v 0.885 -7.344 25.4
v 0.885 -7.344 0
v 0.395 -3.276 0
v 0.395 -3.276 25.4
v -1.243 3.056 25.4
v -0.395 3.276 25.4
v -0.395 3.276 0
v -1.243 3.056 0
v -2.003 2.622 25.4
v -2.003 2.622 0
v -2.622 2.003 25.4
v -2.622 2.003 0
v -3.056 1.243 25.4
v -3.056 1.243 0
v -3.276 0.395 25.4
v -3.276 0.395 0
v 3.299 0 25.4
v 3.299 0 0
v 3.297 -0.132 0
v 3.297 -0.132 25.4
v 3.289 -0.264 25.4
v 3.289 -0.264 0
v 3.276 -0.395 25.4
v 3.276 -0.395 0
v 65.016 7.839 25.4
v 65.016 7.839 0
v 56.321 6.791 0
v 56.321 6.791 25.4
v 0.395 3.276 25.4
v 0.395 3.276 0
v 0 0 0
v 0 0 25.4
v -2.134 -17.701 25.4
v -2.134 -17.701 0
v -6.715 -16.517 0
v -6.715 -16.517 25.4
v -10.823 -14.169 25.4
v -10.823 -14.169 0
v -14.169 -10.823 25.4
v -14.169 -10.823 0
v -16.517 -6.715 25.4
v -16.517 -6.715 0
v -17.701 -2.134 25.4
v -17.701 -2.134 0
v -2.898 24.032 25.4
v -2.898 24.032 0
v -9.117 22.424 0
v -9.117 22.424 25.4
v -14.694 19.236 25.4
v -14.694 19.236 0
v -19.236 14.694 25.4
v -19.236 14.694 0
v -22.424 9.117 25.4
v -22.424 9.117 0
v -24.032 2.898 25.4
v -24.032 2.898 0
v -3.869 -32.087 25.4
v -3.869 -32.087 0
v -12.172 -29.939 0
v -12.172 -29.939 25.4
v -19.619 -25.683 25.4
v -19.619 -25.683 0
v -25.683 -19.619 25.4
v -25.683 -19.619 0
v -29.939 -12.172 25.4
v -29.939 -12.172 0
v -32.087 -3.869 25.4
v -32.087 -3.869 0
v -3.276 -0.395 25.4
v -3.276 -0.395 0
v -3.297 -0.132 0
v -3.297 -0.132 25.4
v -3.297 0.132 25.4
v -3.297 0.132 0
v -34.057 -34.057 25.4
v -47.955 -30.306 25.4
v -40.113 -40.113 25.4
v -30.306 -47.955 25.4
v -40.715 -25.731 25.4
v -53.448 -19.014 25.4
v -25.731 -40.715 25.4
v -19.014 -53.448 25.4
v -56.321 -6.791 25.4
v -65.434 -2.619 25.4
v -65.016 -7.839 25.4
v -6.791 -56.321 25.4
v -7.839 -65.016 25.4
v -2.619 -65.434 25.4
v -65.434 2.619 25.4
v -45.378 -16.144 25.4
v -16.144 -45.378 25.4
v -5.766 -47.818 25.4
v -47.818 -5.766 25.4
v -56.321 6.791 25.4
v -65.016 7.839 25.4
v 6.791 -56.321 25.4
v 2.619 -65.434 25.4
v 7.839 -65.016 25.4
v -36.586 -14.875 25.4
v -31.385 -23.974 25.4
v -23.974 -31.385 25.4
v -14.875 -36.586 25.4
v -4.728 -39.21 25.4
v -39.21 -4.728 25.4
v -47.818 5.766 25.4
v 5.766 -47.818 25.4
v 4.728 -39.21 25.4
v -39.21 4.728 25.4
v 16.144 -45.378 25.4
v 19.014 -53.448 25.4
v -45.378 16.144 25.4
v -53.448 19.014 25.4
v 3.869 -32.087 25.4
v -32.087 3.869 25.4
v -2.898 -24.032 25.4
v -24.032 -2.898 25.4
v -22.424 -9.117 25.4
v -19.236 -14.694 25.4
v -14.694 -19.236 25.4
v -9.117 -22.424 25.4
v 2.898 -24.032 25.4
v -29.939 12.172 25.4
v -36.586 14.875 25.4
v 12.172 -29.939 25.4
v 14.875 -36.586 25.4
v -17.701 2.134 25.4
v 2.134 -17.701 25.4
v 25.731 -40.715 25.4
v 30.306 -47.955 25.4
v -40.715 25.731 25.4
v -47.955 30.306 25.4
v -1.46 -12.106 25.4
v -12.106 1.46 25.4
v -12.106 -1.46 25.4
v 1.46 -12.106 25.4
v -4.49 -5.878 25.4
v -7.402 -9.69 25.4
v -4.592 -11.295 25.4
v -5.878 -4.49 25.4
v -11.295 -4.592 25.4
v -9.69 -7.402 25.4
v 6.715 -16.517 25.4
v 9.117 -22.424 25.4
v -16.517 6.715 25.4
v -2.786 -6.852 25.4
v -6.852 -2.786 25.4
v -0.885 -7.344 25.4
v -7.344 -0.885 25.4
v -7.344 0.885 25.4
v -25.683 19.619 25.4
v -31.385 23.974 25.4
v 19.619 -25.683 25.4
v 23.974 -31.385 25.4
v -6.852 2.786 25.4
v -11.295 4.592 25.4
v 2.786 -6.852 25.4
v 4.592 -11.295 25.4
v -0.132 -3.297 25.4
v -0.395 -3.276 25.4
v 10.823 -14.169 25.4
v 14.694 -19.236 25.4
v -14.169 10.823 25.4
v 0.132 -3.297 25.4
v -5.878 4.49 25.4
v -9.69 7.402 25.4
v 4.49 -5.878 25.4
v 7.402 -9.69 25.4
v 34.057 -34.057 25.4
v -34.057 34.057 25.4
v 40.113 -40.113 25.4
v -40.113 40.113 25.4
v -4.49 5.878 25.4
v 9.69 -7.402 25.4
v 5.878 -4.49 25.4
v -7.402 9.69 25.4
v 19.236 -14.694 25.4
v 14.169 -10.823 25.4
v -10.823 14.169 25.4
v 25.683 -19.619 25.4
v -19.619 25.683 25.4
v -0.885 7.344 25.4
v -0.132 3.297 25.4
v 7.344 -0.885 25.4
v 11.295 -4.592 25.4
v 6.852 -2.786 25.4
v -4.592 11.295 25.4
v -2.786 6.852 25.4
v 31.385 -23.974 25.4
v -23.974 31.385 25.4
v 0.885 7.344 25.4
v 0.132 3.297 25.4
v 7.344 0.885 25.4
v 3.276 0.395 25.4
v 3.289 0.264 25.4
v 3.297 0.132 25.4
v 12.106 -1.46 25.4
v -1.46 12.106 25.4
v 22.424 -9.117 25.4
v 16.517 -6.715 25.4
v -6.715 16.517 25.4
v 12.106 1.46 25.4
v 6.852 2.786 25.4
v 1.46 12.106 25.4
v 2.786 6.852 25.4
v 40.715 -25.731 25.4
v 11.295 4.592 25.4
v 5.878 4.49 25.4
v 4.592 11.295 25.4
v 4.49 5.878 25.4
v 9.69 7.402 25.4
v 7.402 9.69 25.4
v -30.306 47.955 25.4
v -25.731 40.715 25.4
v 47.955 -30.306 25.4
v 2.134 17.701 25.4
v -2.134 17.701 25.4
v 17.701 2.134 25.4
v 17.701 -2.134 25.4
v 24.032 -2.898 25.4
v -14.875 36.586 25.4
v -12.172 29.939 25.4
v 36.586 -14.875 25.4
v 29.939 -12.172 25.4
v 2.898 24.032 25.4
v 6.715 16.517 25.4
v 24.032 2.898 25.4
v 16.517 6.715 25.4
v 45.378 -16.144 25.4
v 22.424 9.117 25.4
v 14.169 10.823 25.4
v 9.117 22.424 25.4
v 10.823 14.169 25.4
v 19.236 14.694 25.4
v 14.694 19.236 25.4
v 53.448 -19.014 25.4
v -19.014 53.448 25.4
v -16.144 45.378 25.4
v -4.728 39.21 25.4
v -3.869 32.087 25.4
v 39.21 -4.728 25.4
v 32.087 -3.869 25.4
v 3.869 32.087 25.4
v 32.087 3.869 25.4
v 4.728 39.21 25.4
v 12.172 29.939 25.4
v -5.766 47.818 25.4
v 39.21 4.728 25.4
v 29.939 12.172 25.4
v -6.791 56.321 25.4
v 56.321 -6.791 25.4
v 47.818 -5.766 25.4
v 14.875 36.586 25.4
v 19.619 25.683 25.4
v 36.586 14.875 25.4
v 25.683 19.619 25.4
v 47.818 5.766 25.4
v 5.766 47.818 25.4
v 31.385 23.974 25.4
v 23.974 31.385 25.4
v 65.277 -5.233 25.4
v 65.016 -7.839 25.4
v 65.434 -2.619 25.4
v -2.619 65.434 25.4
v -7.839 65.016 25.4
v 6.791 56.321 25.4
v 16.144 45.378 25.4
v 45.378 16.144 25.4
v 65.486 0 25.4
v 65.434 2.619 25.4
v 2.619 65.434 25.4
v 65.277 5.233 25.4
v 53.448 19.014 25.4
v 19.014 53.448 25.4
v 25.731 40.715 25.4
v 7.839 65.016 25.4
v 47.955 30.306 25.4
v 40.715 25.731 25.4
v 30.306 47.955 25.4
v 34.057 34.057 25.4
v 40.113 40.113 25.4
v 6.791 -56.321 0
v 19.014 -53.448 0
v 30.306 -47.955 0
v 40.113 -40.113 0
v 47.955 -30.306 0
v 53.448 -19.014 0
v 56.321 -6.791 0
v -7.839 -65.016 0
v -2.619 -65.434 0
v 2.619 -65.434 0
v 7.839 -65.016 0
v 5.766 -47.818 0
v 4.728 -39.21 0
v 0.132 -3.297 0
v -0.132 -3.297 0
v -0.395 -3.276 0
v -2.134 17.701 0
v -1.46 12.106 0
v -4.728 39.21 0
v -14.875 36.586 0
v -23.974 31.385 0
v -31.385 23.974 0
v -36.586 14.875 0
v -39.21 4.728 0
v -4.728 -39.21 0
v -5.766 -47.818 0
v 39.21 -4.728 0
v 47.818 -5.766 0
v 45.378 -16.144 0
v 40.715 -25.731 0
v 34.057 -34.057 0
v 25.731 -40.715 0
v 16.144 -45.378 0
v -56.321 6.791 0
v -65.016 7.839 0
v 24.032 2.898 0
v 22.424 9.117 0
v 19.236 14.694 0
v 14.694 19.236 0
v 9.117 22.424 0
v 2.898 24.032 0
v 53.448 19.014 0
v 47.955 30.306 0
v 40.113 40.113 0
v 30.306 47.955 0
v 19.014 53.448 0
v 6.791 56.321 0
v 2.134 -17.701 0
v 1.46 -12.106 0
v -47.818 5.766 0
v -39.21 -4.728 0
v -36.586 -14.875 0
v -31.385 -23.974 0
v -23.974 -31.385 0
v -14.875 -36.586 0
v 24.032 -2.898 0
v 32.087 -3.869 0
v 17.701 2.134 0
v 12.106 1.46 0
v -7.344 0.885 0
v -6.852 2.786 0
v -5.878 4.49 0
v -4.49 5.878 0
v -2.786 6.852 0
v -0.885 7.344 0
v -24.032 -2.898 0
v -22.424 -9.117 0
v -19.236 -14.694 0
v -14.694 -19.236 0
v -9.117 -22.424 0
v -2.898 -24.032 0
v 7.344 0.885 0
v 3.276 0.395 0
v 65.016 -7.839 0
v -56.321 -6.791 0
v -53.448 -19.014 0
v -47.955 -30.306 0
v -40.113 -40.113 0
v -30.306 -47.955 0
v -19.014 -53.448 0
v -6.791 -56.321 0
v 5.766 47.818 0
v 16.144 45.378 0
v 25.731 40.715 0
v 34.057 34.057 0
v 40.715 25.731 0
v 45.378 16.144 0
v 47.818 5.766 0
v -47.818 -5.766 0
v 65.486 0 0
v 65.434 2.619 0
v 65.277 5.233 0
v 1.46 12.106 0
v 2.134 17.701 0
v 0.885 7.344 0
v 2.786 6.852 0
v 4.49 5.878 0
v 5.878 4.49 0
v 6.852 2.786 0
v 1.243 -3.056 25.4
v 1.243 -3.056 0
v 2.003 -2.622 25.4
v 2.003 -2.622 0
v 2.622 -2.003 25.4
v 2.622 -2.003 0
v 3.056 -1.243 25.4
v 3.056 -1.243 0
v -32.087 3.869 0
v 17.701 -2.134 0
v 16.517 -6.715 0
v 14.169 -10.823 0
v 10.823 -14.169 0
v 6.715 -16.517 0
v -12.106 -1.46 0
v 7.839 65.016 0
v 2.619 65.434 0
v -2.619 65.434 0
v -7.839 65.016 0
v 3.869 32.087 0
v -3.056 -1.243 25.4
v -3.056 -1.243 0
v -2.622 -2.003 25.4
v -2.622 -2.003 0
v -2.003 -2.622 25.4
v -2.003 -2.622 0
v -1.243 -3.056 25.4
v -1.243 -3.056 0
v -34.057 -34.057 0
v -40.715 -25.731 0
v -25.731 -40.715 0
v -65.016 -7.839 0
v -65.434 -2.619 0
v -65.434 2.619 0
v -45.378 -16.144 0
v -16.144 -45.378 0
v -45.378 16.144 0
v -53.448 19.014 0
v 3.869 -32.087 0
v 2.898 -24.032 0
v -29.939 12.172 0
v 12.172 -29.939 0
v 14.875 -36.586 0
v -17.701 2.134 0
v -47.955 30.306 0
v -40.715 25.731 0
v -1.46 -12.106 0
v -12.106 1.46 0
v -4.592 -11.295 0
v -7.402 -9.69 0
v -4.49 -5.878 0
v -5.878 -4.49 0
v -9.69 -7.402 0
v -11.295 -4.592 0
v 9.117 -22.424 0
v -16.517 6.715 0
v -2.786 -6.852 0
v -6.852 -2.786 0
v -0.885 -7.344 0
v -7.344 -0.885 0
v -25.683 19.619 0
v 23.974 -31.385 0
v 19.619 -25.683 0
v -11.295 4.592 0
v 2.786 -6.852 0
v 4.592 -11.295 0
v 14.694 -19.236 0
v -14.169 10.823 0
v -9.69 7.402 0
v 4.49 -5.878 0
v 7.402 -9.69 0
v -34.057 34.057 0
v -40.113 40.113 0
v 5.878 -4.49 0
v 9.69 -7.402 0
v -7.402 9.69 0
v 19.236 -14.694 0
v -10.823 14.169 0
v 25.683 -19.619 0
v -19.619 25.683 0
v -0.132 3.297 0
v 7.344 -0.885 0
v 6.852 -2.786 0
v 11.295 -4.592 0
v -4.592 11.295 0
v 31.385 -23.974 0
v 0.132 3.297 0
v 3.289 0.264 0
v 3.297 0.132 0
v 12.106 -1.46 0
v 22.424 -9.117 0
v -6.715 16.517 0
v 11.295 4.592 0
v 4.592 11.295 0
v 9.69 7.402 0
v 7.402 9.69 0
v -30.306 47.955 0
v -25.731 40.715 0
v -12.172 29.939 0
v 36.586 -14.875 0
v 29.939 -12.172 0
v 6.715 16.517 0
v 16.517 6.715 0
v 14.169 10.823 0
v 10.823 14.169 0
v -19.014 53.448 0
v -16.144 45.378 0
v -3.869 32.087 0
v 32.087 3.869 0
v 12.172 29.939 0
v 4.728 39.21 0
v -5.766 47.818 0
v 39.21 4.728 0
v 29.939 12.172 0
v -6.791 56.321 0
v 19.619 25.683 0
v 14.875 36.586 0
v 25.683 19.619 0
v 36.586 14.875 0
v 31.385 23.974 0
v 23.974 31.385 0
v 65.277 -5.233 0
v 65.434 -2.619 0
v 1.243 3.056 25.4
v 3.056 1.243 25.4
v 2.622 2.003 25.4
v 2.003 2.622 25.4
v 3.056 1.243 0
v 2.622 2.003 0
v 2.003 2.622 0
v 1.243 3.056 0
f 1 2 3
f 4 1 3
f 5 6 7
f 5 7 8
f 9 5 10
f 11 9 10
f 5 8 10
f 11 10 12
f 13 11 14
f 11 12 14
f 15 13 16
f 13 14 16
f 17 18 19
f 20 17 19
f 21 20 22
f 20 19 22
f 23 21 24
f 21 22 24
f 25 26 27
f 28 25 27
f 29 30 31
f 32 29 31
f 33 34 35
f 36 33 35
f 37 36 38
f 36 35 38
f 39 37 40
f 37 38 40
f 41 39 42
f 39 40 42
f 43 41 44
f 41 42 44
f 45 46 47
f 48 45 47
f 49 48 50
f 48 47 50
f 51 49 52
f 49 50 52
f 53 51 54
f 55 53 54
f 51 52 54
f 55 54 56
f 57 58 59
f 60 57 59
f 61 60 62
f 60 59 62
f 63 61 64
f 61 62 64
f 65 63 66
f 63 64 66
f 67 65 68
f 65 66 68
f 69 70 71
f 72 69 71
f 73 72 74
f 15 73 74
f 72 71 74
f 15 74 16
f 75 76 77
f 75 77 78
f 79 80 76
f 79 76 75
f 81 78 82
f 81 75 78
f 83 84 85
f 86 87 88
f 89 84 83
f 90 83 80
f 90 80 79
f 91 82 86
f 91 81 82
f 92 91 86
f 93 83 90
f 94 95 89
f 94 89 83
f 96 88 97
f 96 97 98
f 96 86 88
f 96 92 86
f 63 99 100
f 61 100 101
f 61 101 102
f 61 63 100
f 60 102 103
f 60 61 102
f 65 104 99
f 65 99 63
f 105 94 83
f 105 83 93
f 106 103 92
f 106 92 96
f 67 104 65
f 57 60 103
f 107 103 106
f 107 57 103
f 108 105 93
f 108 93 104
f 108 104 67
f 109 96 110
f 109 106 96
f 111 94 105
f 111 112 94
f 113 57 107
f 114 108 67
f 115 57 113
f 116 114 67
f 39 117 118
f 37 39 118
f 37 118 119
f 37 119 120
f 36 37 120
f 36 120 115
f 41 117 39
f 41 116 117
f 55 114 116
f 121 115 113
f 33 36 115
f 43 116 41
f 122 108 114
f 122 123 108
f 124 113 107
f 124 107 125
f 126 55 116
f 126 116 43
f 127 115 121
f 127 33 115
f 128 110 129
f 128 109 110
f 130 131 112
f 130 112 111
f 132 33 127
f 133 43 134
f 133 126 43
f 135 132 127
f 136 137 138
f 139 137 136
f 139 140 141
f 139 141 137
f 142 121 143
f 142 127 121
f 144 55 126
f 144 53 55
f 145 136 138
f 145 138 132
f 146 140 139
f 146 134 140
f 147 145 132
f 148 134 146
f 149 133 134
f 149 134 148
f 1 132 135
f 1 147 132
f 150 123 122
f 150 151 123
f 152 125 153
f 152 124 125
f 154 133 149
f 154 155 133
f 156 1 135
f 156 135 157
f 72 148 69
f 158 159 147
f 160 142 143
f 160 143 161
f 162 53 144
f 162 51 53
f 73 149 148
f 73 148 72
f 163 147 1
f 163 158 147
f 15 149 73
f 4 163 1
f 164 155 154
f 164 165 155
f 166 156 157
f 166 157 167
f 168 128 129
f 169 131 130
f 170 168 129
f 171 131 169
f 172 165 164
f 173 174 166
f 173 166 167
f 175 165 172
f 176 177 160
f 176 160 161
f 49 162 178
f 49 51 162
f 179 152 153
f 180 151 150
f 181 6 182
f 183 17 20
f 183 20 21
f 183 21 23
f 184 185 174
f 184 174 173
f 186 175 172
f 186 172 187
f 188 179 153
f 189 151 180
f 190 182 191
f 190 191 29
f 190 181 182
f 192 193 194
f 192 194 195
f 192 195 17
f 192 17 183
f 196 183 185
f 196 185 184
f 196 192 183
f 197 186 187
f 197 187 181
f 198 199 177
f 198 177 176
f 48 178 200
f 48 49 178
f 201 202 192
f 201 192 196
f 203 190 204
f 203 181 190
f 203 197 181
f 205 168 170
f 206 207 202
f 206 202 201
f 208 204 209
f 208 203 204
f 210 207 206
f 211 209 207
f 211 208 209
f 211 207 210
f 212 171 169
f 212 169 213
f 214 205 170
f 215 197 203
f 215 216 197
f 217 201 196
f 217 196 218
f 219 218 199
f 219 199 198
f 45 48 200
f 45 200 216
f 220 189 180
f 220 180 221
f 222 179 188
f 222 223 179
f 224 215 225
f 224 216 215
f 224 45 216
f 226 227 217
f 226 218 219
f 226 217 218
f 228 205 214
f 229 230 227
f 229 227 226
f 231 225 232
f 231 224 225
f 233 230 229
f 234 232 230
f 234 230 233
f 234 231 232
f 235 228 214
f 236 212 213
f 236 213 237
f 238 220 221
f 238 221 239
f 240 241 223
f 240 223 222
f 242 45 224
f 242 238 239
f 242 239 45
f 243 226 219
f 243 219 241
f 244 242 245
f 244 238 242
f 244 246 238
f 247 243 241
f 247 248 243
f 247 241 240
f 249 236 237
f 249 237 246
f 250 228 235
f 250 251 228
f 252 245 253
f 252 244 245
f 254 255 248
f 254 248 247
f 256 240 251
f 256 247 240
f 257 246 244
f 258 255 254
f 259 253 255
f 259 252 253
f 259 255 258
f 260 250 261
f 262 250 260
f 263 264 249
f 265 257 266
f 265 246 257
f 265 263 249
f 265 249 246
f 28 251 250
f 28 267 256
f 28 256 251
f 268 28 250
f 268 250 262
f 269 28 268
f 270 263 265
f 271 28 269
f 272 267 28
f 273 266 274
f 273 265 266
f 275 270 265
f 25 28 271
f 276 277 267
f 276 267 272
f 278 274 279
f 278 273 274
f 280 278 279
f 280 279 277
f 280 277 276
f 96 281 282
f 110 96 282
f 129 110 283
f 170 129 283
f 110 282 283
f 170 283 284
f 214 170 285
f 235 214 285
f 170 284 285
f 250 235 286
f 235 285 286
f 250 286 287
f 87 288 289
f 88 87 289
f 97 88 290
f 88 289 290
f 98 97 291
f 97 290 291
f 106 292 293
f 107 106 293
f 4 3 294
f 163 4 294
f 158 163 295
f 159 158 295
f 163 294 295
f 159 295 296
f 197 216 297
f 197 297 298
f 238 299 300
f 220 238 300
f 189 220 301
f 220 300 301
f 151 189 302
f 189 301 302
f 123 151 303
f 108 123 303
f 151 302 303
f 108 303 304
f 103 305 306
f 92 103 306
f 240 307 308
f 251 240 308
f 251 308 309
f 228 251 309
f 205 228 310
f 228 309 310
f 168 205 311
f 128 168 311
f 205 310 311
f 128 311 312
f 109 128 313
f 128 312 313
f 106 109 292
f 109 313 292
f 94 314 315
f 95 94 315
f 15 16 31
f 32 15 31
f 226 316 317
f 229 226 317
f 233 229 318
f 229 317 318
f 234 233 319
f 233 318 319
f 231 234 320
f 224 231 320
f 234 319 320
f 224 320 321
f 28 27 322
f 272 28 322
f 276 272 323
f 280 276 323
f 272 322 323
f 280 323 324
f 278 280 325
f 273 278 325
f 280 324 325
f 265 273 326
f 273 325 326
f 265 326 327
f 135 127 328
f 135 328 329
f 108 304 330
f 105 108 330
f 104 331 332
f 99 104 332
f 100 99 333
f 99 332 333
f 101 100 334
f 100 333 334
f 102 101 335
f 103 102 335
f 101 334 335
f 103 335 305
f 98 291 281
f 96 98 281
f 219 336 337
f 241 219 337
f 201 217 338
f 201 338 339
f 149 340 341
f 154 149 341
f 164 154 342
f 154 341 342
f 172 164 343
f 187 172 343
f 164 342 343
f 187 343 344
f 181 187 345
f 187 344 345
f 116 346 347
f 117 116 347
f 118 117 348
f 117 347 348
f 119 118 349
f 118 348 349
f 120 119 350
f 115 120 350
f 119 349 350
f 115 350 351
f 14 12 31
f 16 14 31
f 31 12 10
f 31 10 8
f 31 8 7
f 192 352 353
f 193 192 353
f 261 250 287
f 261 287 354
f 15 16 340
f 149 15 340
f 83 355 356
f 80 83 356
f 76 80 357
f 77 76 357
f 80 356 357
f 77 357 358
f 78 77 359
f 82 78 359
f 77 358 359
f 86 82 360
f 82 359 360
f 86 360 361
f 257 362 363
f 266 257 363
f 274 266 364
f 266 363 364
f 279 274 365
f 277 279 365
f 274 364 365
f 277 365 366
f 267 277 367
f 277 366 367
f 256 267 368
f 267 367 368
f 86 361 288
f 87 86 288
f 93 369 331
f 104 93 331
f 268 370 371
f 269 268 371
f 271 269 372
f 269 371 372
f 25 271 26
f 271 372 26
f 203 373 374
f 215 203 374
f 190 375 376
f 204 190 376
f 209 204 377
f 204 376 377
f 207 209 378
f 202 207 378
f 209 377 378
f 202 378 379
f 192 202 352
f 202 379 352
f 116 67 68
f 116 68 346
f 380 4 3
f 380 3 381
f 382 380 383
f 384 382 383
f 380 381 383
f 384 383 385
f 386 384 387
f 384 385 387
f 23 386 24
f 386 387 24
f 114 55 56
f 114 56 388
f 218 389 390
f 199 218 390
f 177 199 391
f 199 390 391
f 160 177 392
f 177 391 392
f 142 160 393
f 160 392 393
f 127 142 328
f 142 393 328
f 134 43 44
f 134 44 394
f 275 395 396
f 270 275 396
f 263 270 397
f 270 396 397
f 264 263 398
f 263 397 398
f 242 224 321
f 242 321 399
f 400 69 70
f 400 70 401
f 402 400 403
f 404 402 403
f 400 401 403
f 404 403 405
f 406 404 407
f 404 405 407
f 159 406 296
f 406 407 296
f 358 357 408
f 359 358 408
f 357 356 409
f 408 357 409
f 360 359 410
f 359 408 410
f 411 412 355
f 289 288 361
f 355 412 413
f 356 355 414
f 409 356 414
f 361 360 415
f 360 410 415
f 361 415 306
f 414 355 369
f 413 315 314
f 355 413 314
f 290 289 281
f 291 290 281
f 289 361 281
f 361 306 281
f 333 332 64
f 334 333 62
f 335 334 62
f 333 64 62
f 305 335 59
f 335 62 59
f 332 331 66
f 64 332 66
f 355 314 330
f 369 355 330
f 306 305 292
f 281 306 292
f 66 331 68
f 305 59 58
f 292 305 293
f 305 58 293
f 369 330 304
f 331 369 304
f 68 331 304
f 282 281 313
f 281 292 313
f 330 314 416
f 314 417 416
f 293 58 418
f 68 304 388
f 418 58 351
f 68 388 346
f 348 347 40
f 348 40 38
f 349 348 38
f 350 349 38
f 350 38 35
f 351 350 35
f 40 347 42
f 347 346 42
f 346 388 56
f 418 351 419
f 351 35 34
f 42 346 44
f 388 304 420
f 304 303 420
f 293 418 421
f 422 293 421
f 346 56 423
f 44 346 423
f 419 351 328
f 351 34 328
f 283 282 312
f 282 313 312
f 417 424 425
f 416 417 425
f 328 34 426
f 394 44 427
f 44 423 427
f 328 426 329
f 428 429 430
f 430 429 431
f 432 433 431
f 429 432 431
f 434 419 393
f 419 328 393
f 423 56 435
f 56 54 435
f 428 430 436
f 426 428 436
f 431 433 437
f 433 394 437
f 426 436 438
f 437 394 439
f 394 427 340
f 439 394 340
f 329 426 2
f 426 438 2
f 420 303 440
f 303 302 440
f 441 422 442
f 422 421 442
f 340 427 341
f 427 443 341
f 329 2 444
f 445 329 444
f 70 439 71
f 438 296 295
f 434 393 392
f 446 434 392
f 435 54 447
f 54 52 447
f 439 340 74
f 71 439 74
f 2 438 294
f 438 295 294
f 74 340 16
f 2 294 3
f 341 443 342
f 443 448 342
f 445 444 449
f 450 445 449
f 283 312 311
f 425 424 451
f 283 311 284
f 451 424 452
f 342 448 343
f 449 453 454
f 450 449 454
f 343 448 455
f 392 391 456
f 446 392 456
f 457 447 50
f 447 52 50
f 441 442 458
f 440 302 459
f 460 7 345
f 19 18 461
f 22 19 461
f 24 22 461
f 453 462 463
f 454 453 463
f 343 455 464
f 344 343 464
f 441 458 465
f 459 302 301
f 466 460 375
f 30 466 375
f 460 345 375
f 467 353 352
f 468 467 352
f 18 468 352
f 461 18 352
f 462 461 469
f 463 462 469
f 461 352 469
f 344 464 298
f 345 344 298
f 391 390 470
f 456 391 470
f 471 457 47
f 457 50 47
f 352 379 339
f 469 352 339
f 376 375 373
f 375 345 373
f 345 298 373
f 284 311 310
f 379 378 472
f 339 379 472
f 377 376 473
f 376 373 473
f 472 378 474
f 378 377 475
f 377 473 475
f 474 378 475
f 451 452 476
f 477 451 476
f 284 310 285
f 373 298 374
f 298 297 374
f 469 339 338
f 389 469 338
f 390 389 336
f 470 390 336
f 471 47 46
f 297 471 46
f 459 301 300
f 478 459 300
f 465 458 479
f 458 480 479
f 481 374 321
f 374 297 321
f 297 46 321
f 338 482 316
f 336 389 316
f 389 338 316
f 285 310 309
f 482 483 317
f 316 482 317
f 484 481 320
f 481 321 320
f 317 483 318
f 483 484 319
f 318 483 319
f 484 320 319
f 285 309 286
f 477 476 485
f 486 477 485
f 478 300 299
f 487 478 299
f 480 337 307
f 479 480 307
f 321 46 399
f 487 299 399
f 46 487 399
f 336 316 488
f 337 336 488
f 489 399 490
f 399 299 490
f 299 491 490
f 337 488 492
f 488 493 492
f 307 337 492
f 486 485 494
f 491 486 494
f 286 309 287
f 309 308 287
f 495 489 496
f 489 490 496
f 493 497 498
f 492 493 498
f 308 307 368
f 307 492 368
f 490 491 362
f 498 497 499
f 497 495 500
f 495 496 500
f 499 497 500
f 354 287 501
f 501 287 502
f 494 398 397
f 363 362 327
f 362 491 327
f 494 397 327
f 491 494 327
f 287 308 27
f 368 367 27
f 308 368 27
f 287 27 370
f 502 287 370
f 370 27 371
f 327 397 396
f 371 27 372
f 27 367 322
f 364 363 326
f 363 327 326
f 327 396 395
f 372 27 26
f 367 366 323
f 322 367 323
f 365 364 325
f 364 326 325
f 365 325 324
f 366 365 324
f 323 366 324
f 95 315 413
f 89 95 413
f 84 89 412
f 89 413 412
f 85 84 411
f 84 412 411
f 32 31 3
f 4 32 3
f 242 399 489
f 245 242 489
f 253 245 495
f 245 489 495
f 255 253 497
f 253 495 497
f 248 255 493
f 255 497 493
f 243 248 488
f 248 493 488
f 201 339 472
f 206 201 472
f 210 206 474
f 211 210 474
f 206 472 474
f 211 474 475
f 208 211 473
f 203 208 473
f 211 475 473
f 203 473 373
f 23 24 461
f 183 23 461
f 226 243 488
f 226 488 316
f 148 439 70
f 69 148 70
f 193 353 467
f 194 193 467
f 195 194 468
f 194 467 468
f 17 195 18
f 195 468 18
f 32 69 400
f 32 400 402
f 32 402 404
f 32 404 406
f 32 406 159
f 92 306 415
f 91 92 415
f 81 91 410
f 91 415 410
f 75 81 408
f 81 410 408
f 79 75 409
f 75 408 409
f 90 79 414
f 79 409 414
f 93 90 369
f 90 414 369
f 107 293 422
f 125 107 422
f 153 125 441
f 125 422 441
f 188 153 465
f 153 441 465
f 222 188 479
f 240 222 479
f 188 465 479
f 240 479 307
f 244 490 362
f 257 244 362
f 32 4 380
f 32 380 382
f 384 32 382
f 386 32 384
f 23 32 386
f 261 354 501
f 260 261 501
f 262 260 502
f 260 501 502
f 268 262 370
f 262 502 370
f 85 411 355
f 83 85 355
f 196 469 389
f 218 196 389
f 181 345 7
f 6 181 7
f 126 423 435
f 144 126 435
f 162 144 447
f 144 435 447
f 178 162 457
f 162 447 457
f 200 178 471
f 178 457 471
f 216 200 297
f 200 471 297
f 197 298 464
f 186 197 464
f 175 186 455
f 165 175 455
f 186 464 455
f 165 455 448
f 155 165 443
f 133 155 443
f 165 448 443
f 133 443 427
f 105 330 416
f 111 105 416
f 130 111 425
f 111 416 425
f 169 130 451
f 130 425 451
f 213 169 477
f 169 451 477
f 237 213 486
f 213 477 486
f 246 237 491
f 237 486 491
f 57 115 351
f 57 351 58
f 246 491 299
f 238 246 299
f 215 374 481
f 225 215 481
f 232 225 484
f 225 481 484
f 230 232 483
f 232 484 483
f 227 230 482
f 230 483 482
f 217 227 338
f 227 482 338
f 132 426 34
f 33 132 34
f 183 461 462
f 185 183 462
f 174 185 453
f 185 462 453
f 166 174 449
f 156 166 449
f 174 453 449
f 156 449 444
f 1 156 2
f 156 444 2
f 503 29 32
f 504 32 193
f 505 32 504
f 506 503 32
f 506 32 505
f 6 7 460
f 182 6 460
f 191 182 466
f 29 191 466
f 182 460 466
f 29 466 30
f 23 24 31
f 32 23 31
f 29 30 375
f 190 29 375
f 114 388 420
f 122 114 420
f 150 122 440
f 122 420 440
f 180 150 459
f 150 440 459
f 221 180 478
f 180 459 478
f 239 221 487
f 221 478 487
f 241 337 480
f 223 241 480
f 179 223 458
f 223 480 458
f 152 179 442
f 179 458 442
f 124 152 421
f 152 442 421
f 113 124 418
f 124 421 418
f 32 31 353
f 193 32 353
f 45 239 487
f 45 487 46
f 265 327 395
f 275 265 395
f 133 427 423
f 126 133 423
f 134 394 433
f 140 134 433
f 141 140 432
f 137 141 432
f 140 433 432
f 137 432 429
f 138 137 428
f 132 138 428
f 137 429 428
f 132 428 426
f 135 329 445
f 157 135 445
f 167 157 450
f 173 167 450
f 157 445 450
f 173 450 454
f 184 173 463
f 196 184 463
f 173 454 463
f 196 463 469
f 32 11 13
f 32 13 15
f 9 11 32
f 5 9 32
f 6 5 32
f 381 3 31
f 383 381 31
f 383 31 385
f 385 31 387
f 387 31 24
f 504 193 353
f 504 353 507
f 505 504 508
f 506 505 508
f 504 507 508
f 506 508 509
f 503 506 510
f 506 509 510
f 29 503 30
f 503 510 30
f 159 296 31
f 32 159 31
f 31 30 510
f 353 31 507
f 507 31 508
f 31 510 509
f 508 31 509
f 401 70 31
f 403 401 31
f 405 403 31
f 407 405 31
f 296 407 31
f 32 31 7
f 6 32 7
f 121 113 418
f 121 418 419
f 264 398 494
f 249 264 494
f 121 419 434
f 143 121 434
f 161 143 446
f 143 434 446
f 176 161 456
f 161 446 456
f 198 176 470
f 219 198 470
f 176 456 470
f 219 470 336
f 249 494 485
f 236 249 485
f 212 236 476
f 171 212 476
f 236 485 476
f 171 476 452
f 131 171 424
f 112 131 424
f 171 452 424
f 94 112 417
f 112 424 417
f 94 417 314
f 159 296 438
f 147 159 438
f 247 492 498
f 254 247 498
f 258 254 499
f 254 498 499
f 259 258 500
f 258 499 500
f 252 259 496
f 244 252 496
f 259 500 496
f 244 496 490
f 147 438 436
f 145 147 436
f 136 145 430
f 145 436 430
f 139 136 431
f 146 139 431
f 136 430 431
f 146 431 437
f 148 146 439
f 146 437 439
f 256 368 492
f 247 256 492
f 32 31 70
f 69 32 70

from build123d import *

# Parameters (mm, degrees)
F1_DEPTH = 25.4


with BuildPart() as f1:
    # F0 (on Top) → F1 (new body)
    with BuildSketch(Plane.XY):
        with BuildLine():
            ThreePointArc((0.3949463814, -3.2755851114), (2.3329638302, -2.3329638302), (3.2755851114, -0.3949463814))
            Line((3.2755851114, -0.3949463814), (0, 0))
            Line((0, 0), (0.3949463814, -3.2755851114))
        make_face()
    extrude(amount=F1_DEPTH)


with BuildPart() as f1b:
    # F0 (on Top) → F1, piece 2 (new body)
    with BuildSketch(Plane.XY):
        with BuildLine():
            Line((0, 0), (3.2755851114, 0.3949463814))
            ThreePointArc((3.2755851114, 0.3949463814), (2.3329638302, 2.3329638302), (0.3949463814, 3.2755851114))
            Line((0.3949463814, 3.2755851114), (0, 0))
        make_face()
    extrude(amount=F1_DEPTH)


with BuildPart() as f1c:
    # F0 (on Top) → F1, piece 3 (new body)
    with BuildSketch(Plane.XY):
        with BuildLine():
            Line((-3.2755851114, 0.3949463814), (0, 0))
            Line((0, 0), (-0.3949463814, 3.2755851114))
            ThreePointArc((-0.3949463814, 3.2755851114), (-2.3329638302, 2.3329638302), (-3.2755851114, 0.3949463814))
        make_face()
    extrude(amount=F1_DEPTH)


with BuildPart() as f1d:
    # F0 (on Top) → F1, piece 4 (new body)
    with BuildSketch(Plane.XY):
        with BuildLine():
            Line((-0.3949463814, -3.2755851114), (0, 0))
            Line((0, 0), (-3.2755851114, -0.3949463814))
            ThreePointArc((-3.2755851114, -0.3949463814), (-2.3329638302, -2.3329638302), (-0.3949463814, -3.2755851114))
        make_face()
    extrude(amount=F1_DEPTH)


with BuildPart() as f1e:
    # F0 (on Top) → F1, piece 5 (new body)
    with BuildSketch(Plane.XY):
        with BuildLine():
            Line((-0.8854582133, 7.3437658304), (-1.4596083092, 12.1056210961))
            ThreePointArc((-1.4596083092, 12.1056210961), (-8.621963771, 8.621963771), (-12.1056210961, 1.4596083092))
            Line((-12.1056210961, 1.4596083092), (-7.3437658304, 0.8854582133))
            ThreePointArc((-7.3437658304, 0.8854582133), (-5.2304365411, 5.2304365411), (-0.8854582133, 7.3437658304))
        make_face()
        with BuildLine():
            Line((-2.1343025953, 17.7013643731), (-2.8976111776, 24.0320521462))
            ThreePointArc((-2.8976111776, 24.0320521462), (-17.1163033523, 17.1163033523), (-24.0320521462, 2.8976111776))
            Line((-24.0320521462, 2.8976111776), (-17.7013643731, 2.1343025953))
            ThreePointArc((-17.7013643731, 2.1343025953), (-12.6074094928, 12.6074094928), (-2.1343025953, 17.7013643731))
        make_face()
        with BuildLine():
            Line((-3.8687748548, 32.086637356), (-4.7276929236, 39.2102859597))
            ThreePointArc((-4.7276929236, 39.2102859597), (-27.9266683067, 27.9266683067), (-39.2102859597, 4.7276929236))
            Line((-39.2102859597, 4.7276929236), (-32.086637356, 3.8687748548))
            ThreePointArc((-32.086637356, 3.8687748548), (-22.8530054445, 22.8530054445), (-3.8687748548, 32.086637356))
        make_face()
        with BuildLine():
            Line((-5.7655175254, 47.8177399692), (-6.7907928644, 56.3211135761))
            ThreePointArc((-6.7907928644, 56.3211135761), (-40.1134809146, 40.1134809146), (-56.3211135761, 6.7907928644))
            Line((-56.3211135761, 6.7907928644), (-47.8177399692, 5.7655175254))
            ThreePointArc((-47.8177399693, 5.7655175254), (-34.0571391055, 34.0571391055), (-5.7655175254, 47.8177399693))
        make_face()
        with BuildLine():
            Line((47.8177399692, 5.7655175254), (56.3211135761, 6.7907928644))
            ThreePointArc((56.3211135761, 6.7907928644), (40.1134809146, 40.1134809146), (6.7907928644, 56.3211135761))
            Line((6.7907928644, 56.3211135761), (5.7655175254, 47.8177399692))
            ThreePointArc((5.7655175254, 47.8177399693), (34.0571391055, 34.0571391055), (47.8177399692, 5.7655175254))
        make_face()
        with BuildLine():
            ThreePointArc((6.7907928644, -56.3211135761), (40.1134809146, -40.1134809146), (56.3211135761, -6.7907928644))
            Line((56.3211135761, -6.7907928644), (47.8177399692, -5.7655175254))
            ThreePointArc((47.8177399692, -5.7655175254), (34.0571391055, -34.0571391055), (5.7655175254, -47.8177399693))
            Line((5.7655175254, -47.8177399692), (6.7907928644, -56.3211135761))
        make_face()
        with BuildLine():
            ThreePointArc((48.1640680186, 0), (48.0774080441, 2.8879549621), (47.8177399692, 5.7655175254))
            Line((47.8177399692, 5.7655175254), (39.2102859597, 4.7276929236))
            ThreePointArc((39.2102859597, 4.7276929236), (39.4232123648, 2.368107317), (39.4942730712, 0))
            ThreePointArc((39.4942730712, 0), (39.4232123648, -2.368107317), (39.2102859597, -4.7276929236))
            Line((39.2102859597, -4.7276929236), (47.8177399692, -5.7655175254))
            ThreePointArc((47.8177399692, -5.7655175254), (48.0774080441, -2.8879549621), (48.1640680186, 0))
        make_face()
        with BuildLine():
            ThreePointArc((65.0156007019, -7.8391112903), (65.3686595432, -3.9266206806), (65.4864871592, 0))
            ThreePointArc((65.4864871592, 0), (65.3686595432, 3.9266206806), (65.0156007019, 7.8391112903))
            Line((65.0156007019, 7.8391112903), (56.3211135761, 6.7907928644))
            ThreePointArc((56.3211135761, 6.7907928644), (56.6269581255, 3.4015166658), (56.7290287435, 0))
            ThreePointArc((56.7290287435, 0), (56.6269581255, -3.4015166658), (56.3211135761, -6.7907928644))
            Line((56.3211135761, -6.7907928644), (65.0156007019, -7.8391112903))
        make_face()
        with BuildLine():
            ThreePointArc((56.7290287435, 0), (56.6269581255, 3.4015166658), (56.3211135761, 6.7907928644))
            Line((56.3211135761, 6.7907928644), (47.8177399692, 5.7655175254))
            ThreePointArc((47.8177399692, 5.7655175254), (48.0774080441, 2.8879549621), (48.1640680186, 0))
            ThreePointArc((48.1640680186, 0), (48.0774080441, -2.8879549621), (47.8177399692, -5.7655175254))
            Line((47.8177399692, -5.7655175254), (56.3211135761, -6.7907928644))
            ThreePointArc((56.3211135761, -6.7907928644), (56.6269581255, -3.4015166658), (56.7290287435, 0))
        make_face()
        with BuildLine():
            ThreePointArc((39.4942730712, 0), (39.4232123648, 2.368107317), (39.2102859597, 4.7276929236))
            Line((39.2102859597, 4.7276929236), (32.086637356, 3.8687748548))
            ThreePointArc((32.086637356, 3.8687748548), (32.2608797054, 1.9378741787), (32.3190302406, 0))
            ThreePointArc((32.3190302406, 0), (32.2608797054, -1.9378741787), (32.086637356, -3.8687748548))
            Line((32.086637356, -3.8687748548), (39.2102859597, -4.7276929236))
            ThreePointArc((39.2102859597, -4.7276929236), (39.4232123648, -2.368107317), (39.4942730712, 0))
        make_face()
        with BuildLine():
            ThreePointArc((32.3190302406, 0), (32.2608797054, 1.9378741787), (32.086637356, 3.8687748548))
            Line((32.086637356, 3.8687748548), (24.0320521462, 2.8976111776))
            ThreePointArc((24.0320521462, 2.8976111776), (24.1625551085, 1.4514170743), (24.2061083385, 0))
            ThreePointArc((24.2061083385, 0), (24.1625551085, -1.4514170743), (24.0320521462, -2.8976111776))
            Line((24.0320521462, -2.8976111776), (32.086637356, -3.8687748548))
            ThreePointArc((32.086637356, -3.8687748548), (32.2608797054, -1.9378741787), (32.3190302406, 0))
        make_face()
        with BuildLine():
            ThreePointArc((24.2061083385, 0), (24.1625551085, 1.4514170743), (24.0320521462, 2.8976111776))
            Line((24.0320521462, 2.8976111776), (17.7013643731, 2.1343025953))
            ThreePointArc((17.7013643731, 2.1343025953), (17.7974893512, 1.0690748478), (17.8295694911, 0))
            ThreePointArc((17.8295694911, 0), (17.7974893512, -1.0690748478), (17.7013643731, -2.1343025953))
            Line((17.7013643731, -2.1343025953), (24.0320521462, -2.8976111776))
            ThreePointArc((24.0320521462, -2.8976111776), (24.1625551085, -1.4514170743), (24.2061083385, 0))
        make_face()
        with BuildLine():
            ThreePointArc((17.8295694911, 0), (17.7974893512, 1.0690748478), (17.7013643731, 2.1343025953))
            Line((17.7013643731, 2.1343025953), (12.1056210961, 1.4596083092))
            ThreePointArc((12.1056210961, 1.4596083092), (12.1713591115, 0.7311196334), (12.1932980993, 0))
            ThreePointArc((12.1932980993, 0), (12.1713591115, -0.7311196334), (12.1056210961, -1.4596083092))
            Line((12.1056210961, -1.4596083092), (17.7013643731, -2.1343025953))
            ThreePointArc((17.7013643731, -2.1343025953), (17.7974893512, -1.0690748478), (17.8295694911, 0))
        make_face()
        with BuildLine():
            ThreePointArc((12.1932980993, 0), (12.1713591115, 0.7311196334), (12.1056210961, 1.4596083092))
            Line((12.1056210961, 1.4596083092), (7.3437658304, 0.8854582133))
            ThreePointArc((7.3437658304, 0.8854582133), (7.3836452044, 0.44352713), (7.3969542935, 0))
            ThreePointArc((7.3969542935, 0), (7.3836452044, -0.44352713), (7.3437658304, -0.8854582133))
            Line((7.3437658304, -0.8854582133), (12.1056210961, -1.4596083092))
            ThreePointArc((12.1056210961, -1.4596083092), (12.1713591115, -0.7311196334), (12.1932980993, 0))
        make_face()
        with BuildLine():
            ThreePointArc((7.3969542935, 0), (7.3836452044, 0.44352713), (7.3437658304, 0.8854582133))
            Line((7.3437658304, 0.8854582133), (3.2755851114, 0.3949463814))
            ThreePointArc((3.2755851114, 0.3949463814), (3.2933727542, 0.1978291379), (3.2993090892, 0))
            ThreePointArc((3.2993090892, 0), (3.2933727542, -0.1978291379), (3.2755851114, -0.3949463814))
            Line((3.2755851114, -0.3949463814), (7.3437658304, -0.8854582133))
            ThreePointArc((7.3437658304, -0.8854582133), (7.3836452044, -0.44352713), (7.3969542935, 0))
        make_face()
        with BuildLine():
            ThreePointArc((-12.1056210961, -1.4596083092), (-8.621963771, -8.621963771), (-1.4596083092, -12.1056210961))
            Line((-1.4596083092, -12.1056210961), (-0.8854582133, -7.3437658304))
            ThreePointArc((-0.8854582133, -7.3437658304), (-5.2304365411, -5.2304365411), (-7.3437658304, -0.8854582133))
            Line((-7.3437658304, -0.8854582133), (-12.1056210961, -1.4596083092))
        make_face()
        with BuildLine():
            ThreePointArc((1.4596083092, -12.1056210961), (8.621963771, -8.621963771), (12.1056210961, -1.4596083092))
            Line((12.1056210961, -1.4596083092), (7.3437658304, -0.8854582133))
            ThreePointArc((7.3437658304, -0.8854582133), (5.2304365411, -5.2304365411), (0.8854582133, -7.3437658304))
            Line((0.8854582133, -7.3437658304), (1.4596083092, -12.1056210961))
        make_face()
        with BuildLine():
            Line((7.3437658304, 0.8854582133), (12.1056210961, 1.4596083092))
            ThreePointArc((12.1056210961, 1.4596083092), (8.621963771, 8.621963771), (1.4596083092, 12.1056210961))
            Line((1.4596083092, 12.1056210961), (0.8854582133, 7.3437658304))
            ThreePointArc((0.8854582133, 7.3437658304), (5.2304365411, 5.2304365411), (7.3437658304, 0.8854582133))
        make_face()
        with BuildLine():
            Line((0.8854582133, 7.3437658304), (1.4596083092, 12.1056210961))
            ThreePointArc((1.4596083092, 12.1056210961), (0, 12.1932980993), (-1.4596083092, 12.1056210961))
            Line((-1.4596083092, 12.1056210961), (-0.8854582133, 7.3437658304))
            ThreePointArc((-0.8854582133, 7.3437658304), (0, 7.3969542935), (0.8854582133, 7.3437658304))
        make_face()
        with BuildLine():
            Line((-7.3437658304, 0.8854582133), (-12.1056210961, 1.4596083092))
            ThreePointArc((-12.1056210961, 1.4596083092), (-12.1932980993, 0), (-12.1056210961, -1.4596083092))
            Line((-12.1056210961, -1.4596083092), (-7.3437658304, -0.8854582133))
            ThreePointArc((-7.3437658304, -0.8854582133), (-7.3969542935, 0), (-7.3437658304, 0.8854582133))
        make_face()
        with BuildLine():
            ThreePointArc((-1.4596083092, -12.1056210961), (0, -12.1932980993), (1.4596083092, -12.1056210961))
            Line((1.4596083092, -12.1056210961), (0.8854582133, -7.3437658304))
            ThreePointArc((0.8854582133, -7.3437658304), (0, -7.3969542935), (-0.8854582133, -7.3437658304))
            Line((-0.8854582133, -7.3437658304), (-1.4596083092, -12.1056210961))
        make_face()
        with BuildLine():
            ThreePointArc((2.8976111776, -24.0320521462), (17.1163033523, -17.1163033523), (24.0320521462, -2.8976111776))
            Line((24.0320521462, -2.8976111776), (17.7013643731, -2.1343025953))
            ThreePointArc((17.7013643731, -2.1343025953), (12.6074094928, -12.6074094928), (2.1343025953, -17.7013643731))
            Line((2.1343025953, -17.7013643731), (2.8976111776, -24.0320521462))
        make_face()
        with BuildLine():
            Line((17.7013643731, 2.1343025953), (24.0320521462, 2.8976111776))
            ThreePointArc((24.0320521462, 2.8976111776), (17.1163033523, 17.1163033523), (2.8976111776, 24.0320521462))
            Line((2.8976111776, 24.0320521462), (2.1343025953, 17.7013643731))
            ThreePointArc((2.1343025953, 17.7013643731), (12.6074094928, 12.6074094928), (17.7013643731, 2.1343025953))
        make_face()
        with BuildLine():
            Line((2.1343025953, 17.7013643731), (2.8976111776, 24.0320521462))
            ThreePointArc((2.8976111776, 24.0320521462), (0, 24.2061083385), (-2.8976111776, 24.0320521462))
            Line((-2.8976111776, 24.0320521462), (-2.1343025953, 17.7013643731))
            ThreePointArc((-2.1343025953, 17.7013643731), (0, 17.8295694911), (2.1343025953, 17.7013643731))
        make_face()
        with BuildLine():
            Line((-17.7013643731, 2.1343025953), (-24.0320521462, 2.8976111776))
            ThreePointArc((-24.0320521462, 2.8976111776), (-24.2061083385, 0), (-24.0320521462, -2.8976111776))
            Line((-24.0320521462, -2.8976111776), (-17.7013643731, -2.1343025953))
            ThreePointArc((-17.7013643731, -2.1343025953), (-17.8295694911, 0), (-17.7013643731, 2.1343025953))
        make_face()
        with BuildLine():
            ThreePointArc((-24.0320521462, -2.8976111776), (-17.1163033523, -17.1163033523), (-2.8976111776, -24.0320521462))
            Line((-2.8976111776, -24.0320521462), (-2.1343025953, -17.7013643731))
            ThreePointArc((-2.1343025953, -17.7013643731), (-12.6074094928, -12.6074094928), (-17.7013643731, -2.1343025953))
            Line((-17.7013643731, -2.1343025953), (-24.0320521462, -2.8976111776))
        make_face()
        with BuildLine():
            Line((-32.086637356, 3.8687748548), (-39.2102859597, 4.7276929236))
            ThreePointArc((-39.2102859597, 4.7276929236), (-39.4942730712, 0), (-39.2102859597, -4.7276929236))
            Line((-39.2102859597, -4.7276929236), (-32.086637356, -3.8687748548))
            ThreePointArc((-32.086637356, -3.8687748548), (-32.3190302406, 0), (-32.086637356, 3.8687748548))
        make_face()
        with BuildLine():
            ThreePointArc((-39.2102859597, -4.7276929236), (-27.9266683067, -27.9266683067), (-4.7276929236, -39.2102859597))
            Line((-4.7276929236, -39.2102859597), (-3.8687748548, -32.086637356))
            ThreePointArc((-3.8687748548, -32.086637356), (-22.8530054445, -22.8530054445), (-32.086637356, -3.8687748548))
            Line((-32.086637356, -3.8687748548), (-39.2102859597, -4.7276929236))
        make_face()
        with BuildLine():
            ThreePointArc((4.7276929236, -39.2102859597), (27.9266683067, -27.9266683067), (39.2102859597, -4.7276929236))
            Line((39.2102859597, -4.7276929236), (32.086637356, -3.8687748548))
            ThreePointArc((32.086637356, -3.8687748548), (22.8530054445, -22.8530054445), (3.8687748548, -32.086637356))
            Line((3.8687748548, -32.086637356), (4.7276929236, -39.2102859597))
        make_face()
        with BuildLine():
            ThreePointArc((-4.7276929236, -39.2102859597), (0, -39.4942730712), (4.7276929236, -39.2102859597))
            Line((4.7276929236, -39.2102859597), (3.8687748548, -32.086637356))
            ThreePointArc((3.8687748548, -32.086637356), (0, -32.3190302406), (-3.8687748548, -32.086637356))
            Line((-3.8687748548, -32.086637356), (-4.7276929236, -39.2102859597))
        make_face()
        with BuildLine():
            Line((32.086637356, 3.8687748548), (39.2102859597, 4.7276929236))
            ThreePointArc((39.2102859597, 4.7276929236), (27.9266683067, 27.9266683067), (4.7276929236, 39.2102859597))
            Line((4.7276929236, 39.2102859597), (3.8687748548, 32.086637356))
            ThreePointArc((3.8687748548, 32.086637356), (22.8530054445, 22.8530054445), (32.086637356, 3.8687748548))
        make_face()
        with BuildLine():
            Line((5.7655175254, 47.8177399692), (6.7907928644, 56.3211135761))
            ThreePointArc((6.7907928644, 56.3211135761), (0, 56.7290287435), (-6.7907928644, 56.3211135761))
            Line((-6.7907928644, 56.3211135761), (-5.7655175254, 47.8177399692))
            ThreePointArc((-5.7655175254, 47.8177399693), (0, 48.1640680186), (5.7655175254, 47.8177399693))
        make_face()
        with BuildLine():
            Line((-47.8177399692, 5.7655175254), (-56.3211135761, 6.7907928644))
            ThreePointArc((-56.3211135761, 6.7907928644), (-56.7290287435, 0), (-56.3211135761, -6.7907928644))
            Line((-56.3211135761, -6.7907928644), (-47.8177399692, -5.7655175254))
            ThreePointArc((-47.8177399693, -5.7655175254), (-48.1640680186, 0), (-47.8177399693, 5.7655175254))
        make_face()
        with BuildLine():
            ThreePointArc((-56.3211135761, -6.7907928644), (-40.1134809146, -40.1134809146), (-6.7907928644, -56.3211135761))
            Line((-6.7907928644, -56.3211135761), (-5.7655175254, -47.8177399692))
            ThreePointArc((-5.7655175254, -47.8177399693), (-34.0571391055, -34.0571391055), (-47.8177399693, -5.7655175254))
            Line((-47.8177399692, -5.7655175254), (-56.3211135761, -6.7907928644))
        make_face()
        with BuildLine():
            ThreePointArc((-6.7907928644, -56.3211135761), (0, -56.7290287435), (6.7907928644, -56.3211135761))
            Line((6.7907928644, -56.3211135761), (5.7655175254, -47.8177399692))
            ThreePointArc((5.7655175254, -47.8177399693), (0, -48.1640680186), (-5.7655175254, -47.8177399693))
            Line((-5.7655175254, -47.8177399692), (-6.7907928644, -56.3211135761))
        make_face()
        with BuildLine():
            ThreePointArc((-5.7655175254, -47.8177399693), (0, -48.1640680186), (5.7655175254, -47.8177399693))
            Line((5.7655175254, -47.8177399692), (4.7276929236, -39.2102859597))
            ThreePointArc((4.7276929236, -39.2102859597), (0, -39.4942730712), (-4.7276929236, -39.2102859597))
            Line((-4.7276929236, -39.2102859597), (-5.7655175254, -47.8177399692))
        make_face()
        with BuildLine():
            ThreePointArc((-7.8391112903, -65.0156007019), (0, -65.4864871592), (7.8391112903, -65.0156007019))
            Line((7.8391112903, -65.0156007019), (6.7907928644, -56.3211135761))
            ThreePointArc((6.7907928644, -56.3211135761), (0, -56.7290287435), (-6.7907928644, -56.3211135761))
            Line((-6.7907928644, -56.3211135761), (-7.8391112903, -65.0156007019))
        make_face()
        with BuildLine():
            ThreePointArc((-3.8687748548, -32.086637356), (0, -32.3190302406), (3.8687748548, -32.086637356))
            Line((3.8687748548, -32.086637356), (2.8976111776, -24.0320521462))
            ThreePointArc((2.8976111776, -24.0320521462), (0, -24.2061083385), (-2.8976111776, -24.0320521462))
            Line((-2.8976111776, -24.0320521462), (-3.8687748548, -32.086637356))
        make_face()
        with BuildLine():
            ThreePointArc((-2.1343025953, -17.7013643731), (0, -17.8295694911), (2.1343025953, -17.7013643731))
            Line((2.1343025953, -17.7013643731), (1.4596083092, -12.1056210961))
            ThreePointArc((1.4596083092, -12.1056210961), (0, -12.1932980993), (-1.4596083092, -12.1056210961))
            Line((-1.4596083092, -12.1056210961), (-2.1343025953, -17.7013643731))
        make_face()
        with BuildLine():
            ThreePointArc((-2.8976111776, -24.0320521462), (0, -24.2061083385), (2.8976111776, -24.0320521462))
            Line((2.8976111776, -24.0320521462), (2.1343025953, -17.7013643731))
            ThreePointArc((2.1343025953, -17.7013643731), (0, -17.8295694911), (-2.1343025953, -17.7013643731))
            Line((-2.1343025953, -17.7013643731), (-2.8976111776, -24.0320521462))
        make_face()
        with BuildLine():
            Line((-12.1056210961, 1.4596083092), (-17.7013643731, 2.1343025953))
            ThreePointArc((-17.7013643731, 2.1343025953), (-17.8295694911, 0), (-17.7013643731, -2.1343025953))
            Line((-17.7013643731, -2.1343025953), (-12.1056210961, -1.4596083092))
            ThreePointArc((-12.1056210961, -1.4596083092), (-12.1932980993, 0), (-12.1056210961, 1.4596083092))
        make_face()
        with BuildLine():
            Line((-24.0320521462, 2.8976111776), (-32.086637356, 3.8687748548))
            ThreePointArc((-32.086637356, 3.8687748548), (-32.3190302406, 0), (-32.086637356, -3.8687748548))
            Line((-32.086637356, -3.8687748548), (-24.0320521462, -2.8976111776))
            ThreePointArc((-24.0320521462, -2.8976111776), (-24.2061083385, 0), (-24.0320521462, 2.8976111776))
        make_face()
        with BuildLine():
            Line((-39.2102859597, 4.7276929236), (-47.8177399692, 5.7655175254))
            ThreePointArc((-47.8177399693, 5.7655175254), (-48.1640680186, 0), (-47.8177399693, -5.7655175254))
            Line((-47.8177399692, -5.7655175254), (-39.2102859597, -4.7276929236))
            ThreePointArc((-39.2102859597, -4.7276929236), (-39.4942730712, 0), (-39.2102859597, 4.7276929236))
        make_face()
        with BuildLine():
            Line((-56.3211135761, 6.7907928644), (-65.0156007019, 7.8391112903))
            ThreePointArc((-65.0156007019, 7.8391112903), (-65.4864871592, 0), (-65.0156007019, -7.8391112903))
            Line((-65.0156007019, -7.8391112903), (-56.3211135761, -6.7907928644))
            ThreePointArc((-56.3211135761, -6.7907928644), (-56.7290287435, 0), (-56.3211135761, 6.7907928644))
        make_face()
        with BuildLine():
            Line((6.7907928644, 56.3211135761), (7.8391112903, 65.0156007019))
            ThreePointArc((7.8391112903, 65.0156007019), (0, 65.4864871592), (-7.8391112903, 65.0156007019))
            Line((-7.8391112903, 65.0156007019), (-6.7907928644, 56.3211135761))
            ThreePointArc((-6.7907928644, 56.3211135761), (0, 56.7290287435), (6.7907928644, 56.3211135761))
        make_face()
        with BuildLine():
            Line((4.7276929236, 39.2102859597), (5.7655175254, 47.8177399692))
            ThreePointArc((5.7655175254, 47.8177399693), (0, 48.1640680186), (-5.7655175254, 47.8177399693))
            Line((-5.7655175254, 47.8177399692), (-4.7276929236, 39.2102859597))
            ThreePointArc((-4.7276929236, 39.2102859597), (0, 39.4942730712), (4.7276929236, 39.2102859597))
        make_face()
        with BuildLine():
            Line((2.8976111776, 24.0320521462), (3.8687748548, 32.086637356))
            ThreePointArc((3.8687748548, 32.086637356), (0, 32.3190302406), (-3.8687748548, 32.086637356))
            Line((-3.8687748548, 32.086637356), (-2.8976111776, 24.0320521462))
            ThreePointArc((-2.8976111776, 24.0320521462), (0, 24.2061083385), (2.8976111776, 24.0320521462))
        make_face()
        with BuildLine():
            Line((1.4596083092, 12.1056210961), (2.1343025953, 17.7013643731))
            ThreePointArc((2.1343025953, 17.7013643731), (0, 17.8295694911), (-2.1343025953, 17.7013643731))
            Line((-2.1343025953, 17.7013643731), (-1.4596083092, 12.1056210961))
            ThreePointArc((-1.4596083092, 12.1056210961), (0, 12.1932980993), (1.4596083092, 12.1056210961))
        make_face()
        with BuildLine():
            Line((3.8687748548, 32.086637356), (4.7276929236, 39.2102859597))
            ThreePointArc((4.7276929236, 39.2102859597), (0, 39.4942730712), (-4.7276929236, 39.2102859597))
            Line((-4.7276929236, 39.2102859597), (-3.8687748548, 32.086637356))
            ThreePointArc((-3.8687748548, 32.086637356), (0, 32.3190302406), (3.8687748548, 32.086637356))
        make_face()
        with BuildLine():
            ThreePointArc((-0.8854582133, -7.3437658304), (0, -7.3969542935), (0.8854582133, -7.3437658304))
            Line((0.8854582133, -7.3437658304), (0.3949463814, -3.2755851114))
            ThreePointArc((0.3949463814, -3.2755851114), (0, -3.2993090892), (-0.3949463814, -3.2755851114))
            Line((-0.3949463814, -3.2755851114), (-0.8854582133, -7.3437658304))
        make_face()
        with BuildLine():
            Line((0.3949463814, 3.2755851114), (0.8854582133, 7.3437658304))
            ThreePointArc((0.8854582133, 7.3437658304), (0, 7.3969542935), (-0.8854582133, 7.3437658304))
            Line((-0.8854582133, 7.3437658304), (-0.3949463814, 3.2755851114))
            ThreePointArc((-0.3949463814, 3.2755851114), (0, 3.2993090892), (0.3949463814, 3.2755851114))
        make_face()
        with BuildLine():
            Line((-3.2755851114, 0.3949463814), (-7.3437658304, 0.8854582133))
            ThreePointArc((-7.3437658304, 0.8854582133), (-7.3969542935, 0), (-7.3437658304, -0.8854582133))
            Line((-7.3437658304, -0.8854582133), (-3.2755851114, -0.3949463814))
            ThreePointArc((-3.2755851114, -0.3949463814), (-3.2993090892, 0), (-3.2755851114, 0.3949463814))
        make_face()
    extrude(amount=F1_DEPTH)


solid = Compound([f1.part, f1b.part, f1c.part, f1d.part, f1e.part])
